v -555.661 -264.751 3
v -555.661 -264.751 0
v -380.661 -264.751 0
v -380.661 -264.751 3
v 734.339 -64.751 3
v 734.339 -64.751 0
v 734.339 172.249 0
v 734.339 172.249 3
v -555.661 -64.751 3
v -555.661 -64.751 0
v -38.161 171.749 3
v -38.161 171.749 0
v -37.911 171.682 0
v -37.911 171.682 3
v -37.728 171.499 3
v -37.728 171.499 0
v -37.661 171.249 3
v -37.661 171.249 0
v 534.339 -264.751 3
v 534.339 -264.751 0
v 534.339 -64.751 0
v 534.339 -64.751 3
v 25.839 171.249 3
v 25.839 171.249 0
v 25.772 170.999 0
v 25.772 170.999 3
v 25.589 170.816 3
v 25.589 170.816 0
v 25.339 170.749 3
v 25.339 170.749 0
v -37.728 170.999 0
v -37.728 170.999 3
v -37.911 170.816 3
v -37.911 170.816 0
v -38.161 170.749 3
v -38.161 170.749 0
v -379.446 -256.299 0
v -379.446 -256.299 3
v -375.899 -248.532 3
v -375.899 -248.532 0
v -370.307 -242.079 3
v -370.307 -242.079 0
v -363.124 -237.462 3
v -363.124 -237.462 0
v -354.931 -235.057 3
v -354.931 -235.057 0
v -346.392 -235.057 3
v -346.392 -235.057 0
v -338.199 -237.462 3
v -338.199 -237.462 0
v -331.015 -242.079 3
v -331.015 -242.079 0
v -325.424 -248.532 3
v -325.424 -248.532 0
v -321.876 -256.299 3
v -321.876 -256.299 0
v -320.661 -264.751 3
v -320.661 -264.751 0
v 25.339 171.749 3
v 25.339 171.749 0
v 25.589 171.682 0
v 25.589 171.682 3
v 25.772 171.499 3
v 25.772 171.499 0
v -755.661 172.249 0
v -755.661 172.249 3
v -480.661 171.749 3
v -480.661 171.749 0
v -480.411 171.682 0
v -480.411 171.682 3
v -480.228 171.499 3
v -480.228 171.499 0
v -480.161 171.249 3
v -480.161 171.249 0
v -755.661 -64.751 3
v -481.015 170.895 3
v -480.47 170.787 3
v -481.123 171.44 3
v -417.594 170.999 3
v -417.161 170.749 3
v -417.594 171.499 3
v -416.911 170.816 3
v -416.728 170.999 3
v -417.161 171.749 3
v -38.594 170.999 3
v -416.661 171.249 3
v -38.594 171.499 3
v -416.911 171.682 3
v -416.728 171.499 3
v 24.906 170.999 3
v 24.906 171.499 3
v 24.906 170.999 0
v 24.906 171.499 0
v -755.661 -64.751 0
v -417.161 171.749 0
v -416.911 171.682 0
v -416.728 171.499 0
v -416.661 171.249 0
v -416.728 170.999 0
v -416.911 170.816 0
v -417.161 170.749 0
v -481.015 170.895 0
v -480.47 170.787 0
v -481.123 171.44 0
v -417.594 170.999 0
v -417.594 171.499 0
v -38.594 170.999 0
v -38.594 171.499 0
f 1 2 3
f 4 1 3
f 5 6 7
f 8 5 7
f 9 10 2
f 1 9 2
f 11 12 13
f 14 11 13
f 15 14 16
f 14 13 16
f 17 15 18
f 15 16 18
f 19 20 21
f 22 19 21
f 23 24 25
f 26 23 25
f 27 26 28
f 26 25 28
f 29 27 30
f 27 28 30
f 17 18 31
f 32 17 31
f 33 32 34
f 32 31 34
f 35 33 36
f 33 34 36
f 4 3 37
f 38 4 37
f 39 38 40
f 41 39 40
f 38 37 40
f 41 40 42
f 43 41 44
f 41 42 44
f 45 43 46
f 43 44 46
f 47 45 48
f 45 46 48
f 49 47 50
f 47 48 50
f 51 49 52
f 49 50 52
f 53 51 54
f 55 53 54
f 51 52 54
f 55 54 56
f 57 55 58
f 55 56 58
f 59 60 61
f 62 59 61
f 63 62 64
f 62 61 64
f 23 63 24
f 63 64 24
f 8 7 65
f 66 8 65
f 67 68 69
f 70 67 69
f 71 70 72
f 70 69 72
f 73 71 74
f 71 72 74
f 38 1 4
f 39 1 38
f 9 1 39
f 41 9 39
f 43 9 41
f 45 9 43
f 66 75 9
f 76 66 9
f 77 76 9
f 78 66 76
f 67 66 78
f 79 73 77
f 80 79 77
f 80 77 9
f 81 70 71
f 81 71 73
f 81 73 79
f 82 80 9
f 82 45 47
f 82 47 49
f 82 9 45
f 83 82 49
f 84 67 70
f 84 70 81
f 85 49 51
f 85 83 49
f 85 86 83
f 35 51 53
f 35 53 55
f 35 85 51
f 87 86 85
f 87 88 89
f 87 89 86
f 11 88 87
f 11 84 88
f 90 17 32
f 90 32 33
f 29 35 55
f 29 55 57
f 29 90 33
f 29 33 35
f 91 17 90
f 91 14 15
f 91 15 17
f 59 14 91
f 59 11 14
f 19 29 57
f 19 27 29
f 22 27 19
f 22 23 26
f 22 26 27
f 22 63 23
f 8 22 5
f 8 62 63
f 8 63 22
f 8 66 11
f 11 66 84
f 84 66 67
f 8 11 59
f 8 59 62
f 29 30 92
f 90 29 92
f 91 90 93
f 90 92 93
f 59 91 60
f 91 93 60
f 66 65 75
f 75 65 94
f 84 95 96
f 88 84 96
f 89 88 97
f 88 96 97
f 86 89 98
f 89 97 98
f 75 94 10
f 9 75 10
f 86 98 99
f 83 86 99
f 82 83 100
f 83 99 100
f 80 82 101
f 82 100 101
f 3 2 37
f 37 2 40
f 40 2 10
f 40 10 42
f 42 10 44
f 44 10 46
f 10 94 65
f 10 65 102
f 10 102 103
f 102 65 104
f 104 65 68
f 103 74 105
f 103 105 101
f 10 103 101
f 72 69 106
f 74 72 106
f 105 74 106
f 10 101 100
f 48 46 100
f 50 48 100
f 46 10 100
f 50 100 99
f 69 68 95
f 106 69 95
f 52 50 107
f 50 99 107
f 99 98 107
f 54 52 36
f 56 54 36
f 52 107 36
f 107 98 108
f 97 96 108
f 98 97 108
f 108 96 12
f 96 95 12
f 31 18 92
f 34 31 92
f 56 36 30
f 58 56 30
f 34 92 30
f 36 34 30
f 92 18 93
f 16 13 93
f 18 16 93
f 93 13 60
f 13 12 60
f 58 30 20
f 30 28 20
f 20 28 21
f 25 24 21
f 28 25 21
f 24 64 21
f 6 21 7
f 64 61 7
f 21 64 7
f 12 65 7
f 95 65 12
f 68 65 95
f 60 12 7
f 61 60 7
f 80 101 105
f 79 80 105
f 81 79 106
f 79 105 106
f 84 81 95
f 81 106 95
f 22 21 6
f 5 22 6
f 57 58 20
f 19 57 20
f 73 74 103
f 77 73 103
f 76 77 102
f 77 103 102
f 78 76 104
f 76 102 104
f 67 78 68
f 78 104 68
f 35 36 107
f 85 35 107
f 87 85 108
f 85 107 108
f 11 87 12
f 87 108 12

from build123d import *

# Parameters (mm, degrees)
F1_DEPTH = 3
F2_DEPTH = 25
F3_DEPTH = 25


with BuildPart() as f1:
    # F0 (on Top) → F1 (new body)
    with BuildSketch(Plane.XY):
        with BuildLine():
            Line((-480.661231, 172.248819), (-755.661231, 172.248819))
            Line((-755.661231, 172.248819), (-755.661231, -64.751181))
            Line((-755.661231, -64.751181), (-555.661231, -64.751181))
            Line((-555.661231, -64.751181), (-555.661231, -264.751181))
            Line((-555.661231, -264.751181), (-380.661231, -264.751181))
            ThreePointArc((-380.661231, -264.751181), (-350.661231, -234.751181), (-320.661231, -264.751181))
            Line((-320.661231, -264.751181), (534.338769, -264.751181))
            Line((534.338769, -264.751181), (534.338769, -64.751181))
            Line((534.338769, -64.751181), (734.338769, -64.751181))
            Line((734.338769, -64.751181), (734.338769, 172.248819))
            Line((734.338769, 172.248819), (25.338769, 172.248819))
            Line((25.338769, 172.248819), (-38.161231, 172.248819))
            Line((-38.161231, 172.248819), (-402.510524, 172.248819))
            Line((-402.510524, 172.248819), (-417.161231, 172.248819))
            Line((-417.161231, 172.248819), (-480.661231, 172.248819))
        make_face()
        with BuildLine():
            ThreePointArc((-480.161231, 171.248819), (-481.014785, 170.895266), (-480.661231, 171.748819))
            ThreePointArc((-480.661231, 171.748819), (-480.307678, 171.602373), (-480.161231, 171.248819))
        make_face(mode=Mode.SUBTRACT)
        with BuildLine():
            ThreePointArc((-417.161231, 170.748819), (-417.661231, 171.248819), (-417.161231, 171.748819))
            ThreePointArc((-417.161231, 171.748819), (-416.807678, 171.602373), (-416.661231, 171.248819))
            ThreePointArc((-416.661231, 171.248819), (-416.807678, 170.895266), (-417.161231, 170.748819))
        make_face(mode=Mode.SUBTRACT)
        with BuildLine():
            ThreePointArc((-38.161231, 170.748819), (-38.661231, 171.248819), (-38.161231, 171.748819))
            ThreePointArc((-38.161231, 171.748819), (-37.807678, 171.602373), (-37.661231, 171.248819))
            ThreePointArc((-37.661231, 171.248819), (-37.807678, 170.895266), (-38.161231, 170.748819))
        make_face(mode=Mode.SUBTRACT)
        with BuildLine():
            ThreePointArc((25.338769, 170.748819), (24.838769, 171.248819), (25.338769, 171.748819))
            ThreePointArc((25.338769, 171.748819), (25.692322, 171.602373), (25.838769, 171.248819))
            ThreePointArc((25.838769, 171.248819), (25.692322, 170.895266), (25.338769, 170.748819))
        make_face(mode=Mode.SUBTRACT)
    extrude(amount=F1_DEPTH)

    # F0 (on Top) → F2 (cut)
    with BuildSketch(Plane.XY):
        with BuildLine():
            ThreePointArc((-480.161231, 171.248819), (-480.307678, 171.602373), (-480.661231, 171.748819))
            ThreePointArc((-480.661231, 171.748819), (-481.014785, 170.895266), (-480.161231, 171.248819))
        make_face()
        with BuildLine():
            Line((-480.661231, 172.248819), (-755.661231, 172.248819))
            Line((-755.661231, 172.248819), (-755.661231, -64.751181))
            Line((-755.661231, -64.751181), (-555.661231, -64.751181))
            Line((-555.661231, -64.751181), (-555.661231, -264.751181))
            Line((-555.661231, -264.751181), (-380.661231, -264.751181))
            ThreePointArc((-380.661231, -264.751181), (-350.661231, -234.751181), (-320.661231, -264.751181))
            Line((-320.661231, -264.751181), (534.338769, -264.751181))
            Line((534.338769, -264.751181), (534.338769, -64.751181))
            Line((534.338769, -64.751181), (734.338769, -64.751181))
            Line((734.338769, -64.751181), (734.338769, 172.248819))
            Line((734.338769, 172.248819), (25.338769, 172.248819))
            Line((25.338769, 172.248819), (-38.161231, 172.248819))
            Line((-38.161231, 172.248819), (-402.510524, 172.248819))
            Line((-402.510524, 172.248819), (-417.161231, 172.248819))
            Line((-417.161231, 172.248819), (-480.661231, 172.248819))
        make_face()
        with BuildLine():
            ThreePointArc((-480.161231, 171.248819), (-481.014785, 170.895266), (-480.661231, 171.748819))
            ThreePointArc((-480.661231, 171.748819), (-480.307678, 171.602373), (-480.161231, 171.248819))
        make_face(mode=Mode.SUBTRACT)
        with BuildLine():
            ThreePointArc((-417.161231, 170.748819), (-417.661231, 171.248819), (-417.161231, 171.748819))
            ThreePointArc((-417.161231, 171.748819), (-416.807678, 171.602373), (-416.661231, 171.248819))
            ThreePointArc((-416.661231, 171.248819), (-416.807678, 170.895266), (-417.161231, 170.748819))
        make_face(mode=Mode.SUBTRACT)
        with BuildLine():
            ThreePointArc((-38.161231, 170.748819), (-38.661231, 171.248819), (-38.161231, 171.748819))
            ThreePointArc((-38.161231, 171.748819), (-37.807678, 171.602373), (-37.661231, 171.248819))
            ThreePointArc((-37.661231, 171.248819), (-37.807678, 170.895266), (-38.161231, 170.748819))
        make_face(mode=Mode.SUBTRACT)
        with BuildLine():
            ThreePointArc((25.338769, 170.748819), (24.838769, 171.248819), (25.338769, 171.748819))
            ThreePointArc((25.338769, 171.748819), (25.692322, 171.602373), (25.838769, 171.248819))
            ThreePointArc((25.838769, 171.248819), (25.692322, 170.895266), (25.338769, 170.748819))
        make_face(mode=Mode.SUBTRACT)
        with BuildLine():
            ThreePointArc((-320.661231, -264.751181), (-350.661231, -234.751181), (-380.661231, -264.751181))
            Line((-380.661231, -264.751181), (-320.661231, -264.751181))
        make_face()
    extrude(amount=-F2_DEPTH, mode=Mode.SUBTRACT)

    # F0 (on Top) → F3 (cut)
    with BuildSketch(Plane.XY):
        with BuildLine():
            ThreePointArc((-480.161231, 171.248819), (-480.307678, 171.602373), (-480.661231, 171.748819))
            ThreePointArc((-480.661231, 171.748819), (-481.014785, 170.895266), (-480.161231, 171.248819))
        make_face()
        with BuildLine():
            Line((-480.661231, 172.248819), (-755.661231, 172.248819))
            Line((-755.661231, 172.248819), (-755.661231, -64.751181))
            Line((-755.661231, -64.751181), (-555.661231, -64.751181))
            Line((-555.661231, -64.751181), (-555.661231, -264.751181))
            Line((-555.661231, -264.751181), (-380.661231, -264.751181))
            ThreePointArc((-380.661231, -264.751181), (-350.661231, -234.751181), (-320.661231, -264.751181))
            Line((-320.661231, -264.751181), (534.338769, -264.751181))
            Line((534.338769, -264.751181), (534.338769, -64.751181))
            Line((534.338769, -64.751181), (734.338769, -64.751181))
            Line((734.338769, -64.751181), (734.338769, 172.248819))
            Line((734.338769, 172.248819), (25.338769, 172.248819))
            Line((25.338769, 172.248819), (-38.161231, 172.248819))
            Line((-38.161231, 172.248819), (-402.510524, 172.248819))
            Line((-402.510524, 172.248819), (-417.161231, 172.248819))
            Line((-417.161231, 172.248819), (-480.661231, 172.248819))
        make_face()
        with BuildLine():
            ThreePointArc((-480.161231, 171.248819), (-481.014785, 170.895266), (-480.661231, 171.748819))
            ThreePointArc((-480.661231, 171.748819), (-480.307678, 171.602373), (-480.161231, 171.248819))
        make_face(mode=Mode.SUBTRACT)
        with BuildLine():
            ThreePointArc((-417.161231, 170.748819), (-417.661231, 171.248819), (-417.161231, 171.748819))
            ThreePointArc((-417.161231, 171.748819), (-416.807678, 171.602373), (-416.661231, 171.248819))
            ThreePointArc((-416.661231, 171.248819), (-416.807678, 170.895266), (-417.161231, 170.748819))
        make_face(mode=Mode.SUBTRACT)
        with BuildLine():
            ThreePointArc((-38.161231, 170.748819), (-38.661231, 171.248819), (-38.161231, 171.748819))
            ThreePointArc((-38.161231, 171.748819), (-37.807678, 171.602373), (-37.661231, 171.248819))
            ThreePointArc((-37.661231, 171.248819), (-37.807678, 170.895266), (-38.161231, 170.748819))
        make_face(mode=Mode.SUBTRACT)
        with BuildLine():
            ThreePointArc((25.338769, 170.748819), (24.838769, 171.248819), (25.338769, 171.748819))
            ThreePointArc((25.338769, 171.748819), (25.692322, 171.602373), (25.838769, 171.248819))
            ThreePointArc((25.838769, 171.248819), (25.692322, 170.895266), (25.338769, 170.748819))
        make_face(mode=Mode.SUBTRACT)
        with BuildLine():
            ThreePointArc((-320.661231, -264.751181), (-350.661231, -234.751181), (-380.661231, -264.751181))
            Line((-380.661231, -264.751181), (-320.661231, -264.751181))
        make_face()
    extrude(amount=-F3_DEPTH, mode=Mode.SUBTRACT)


solid = f1.part
